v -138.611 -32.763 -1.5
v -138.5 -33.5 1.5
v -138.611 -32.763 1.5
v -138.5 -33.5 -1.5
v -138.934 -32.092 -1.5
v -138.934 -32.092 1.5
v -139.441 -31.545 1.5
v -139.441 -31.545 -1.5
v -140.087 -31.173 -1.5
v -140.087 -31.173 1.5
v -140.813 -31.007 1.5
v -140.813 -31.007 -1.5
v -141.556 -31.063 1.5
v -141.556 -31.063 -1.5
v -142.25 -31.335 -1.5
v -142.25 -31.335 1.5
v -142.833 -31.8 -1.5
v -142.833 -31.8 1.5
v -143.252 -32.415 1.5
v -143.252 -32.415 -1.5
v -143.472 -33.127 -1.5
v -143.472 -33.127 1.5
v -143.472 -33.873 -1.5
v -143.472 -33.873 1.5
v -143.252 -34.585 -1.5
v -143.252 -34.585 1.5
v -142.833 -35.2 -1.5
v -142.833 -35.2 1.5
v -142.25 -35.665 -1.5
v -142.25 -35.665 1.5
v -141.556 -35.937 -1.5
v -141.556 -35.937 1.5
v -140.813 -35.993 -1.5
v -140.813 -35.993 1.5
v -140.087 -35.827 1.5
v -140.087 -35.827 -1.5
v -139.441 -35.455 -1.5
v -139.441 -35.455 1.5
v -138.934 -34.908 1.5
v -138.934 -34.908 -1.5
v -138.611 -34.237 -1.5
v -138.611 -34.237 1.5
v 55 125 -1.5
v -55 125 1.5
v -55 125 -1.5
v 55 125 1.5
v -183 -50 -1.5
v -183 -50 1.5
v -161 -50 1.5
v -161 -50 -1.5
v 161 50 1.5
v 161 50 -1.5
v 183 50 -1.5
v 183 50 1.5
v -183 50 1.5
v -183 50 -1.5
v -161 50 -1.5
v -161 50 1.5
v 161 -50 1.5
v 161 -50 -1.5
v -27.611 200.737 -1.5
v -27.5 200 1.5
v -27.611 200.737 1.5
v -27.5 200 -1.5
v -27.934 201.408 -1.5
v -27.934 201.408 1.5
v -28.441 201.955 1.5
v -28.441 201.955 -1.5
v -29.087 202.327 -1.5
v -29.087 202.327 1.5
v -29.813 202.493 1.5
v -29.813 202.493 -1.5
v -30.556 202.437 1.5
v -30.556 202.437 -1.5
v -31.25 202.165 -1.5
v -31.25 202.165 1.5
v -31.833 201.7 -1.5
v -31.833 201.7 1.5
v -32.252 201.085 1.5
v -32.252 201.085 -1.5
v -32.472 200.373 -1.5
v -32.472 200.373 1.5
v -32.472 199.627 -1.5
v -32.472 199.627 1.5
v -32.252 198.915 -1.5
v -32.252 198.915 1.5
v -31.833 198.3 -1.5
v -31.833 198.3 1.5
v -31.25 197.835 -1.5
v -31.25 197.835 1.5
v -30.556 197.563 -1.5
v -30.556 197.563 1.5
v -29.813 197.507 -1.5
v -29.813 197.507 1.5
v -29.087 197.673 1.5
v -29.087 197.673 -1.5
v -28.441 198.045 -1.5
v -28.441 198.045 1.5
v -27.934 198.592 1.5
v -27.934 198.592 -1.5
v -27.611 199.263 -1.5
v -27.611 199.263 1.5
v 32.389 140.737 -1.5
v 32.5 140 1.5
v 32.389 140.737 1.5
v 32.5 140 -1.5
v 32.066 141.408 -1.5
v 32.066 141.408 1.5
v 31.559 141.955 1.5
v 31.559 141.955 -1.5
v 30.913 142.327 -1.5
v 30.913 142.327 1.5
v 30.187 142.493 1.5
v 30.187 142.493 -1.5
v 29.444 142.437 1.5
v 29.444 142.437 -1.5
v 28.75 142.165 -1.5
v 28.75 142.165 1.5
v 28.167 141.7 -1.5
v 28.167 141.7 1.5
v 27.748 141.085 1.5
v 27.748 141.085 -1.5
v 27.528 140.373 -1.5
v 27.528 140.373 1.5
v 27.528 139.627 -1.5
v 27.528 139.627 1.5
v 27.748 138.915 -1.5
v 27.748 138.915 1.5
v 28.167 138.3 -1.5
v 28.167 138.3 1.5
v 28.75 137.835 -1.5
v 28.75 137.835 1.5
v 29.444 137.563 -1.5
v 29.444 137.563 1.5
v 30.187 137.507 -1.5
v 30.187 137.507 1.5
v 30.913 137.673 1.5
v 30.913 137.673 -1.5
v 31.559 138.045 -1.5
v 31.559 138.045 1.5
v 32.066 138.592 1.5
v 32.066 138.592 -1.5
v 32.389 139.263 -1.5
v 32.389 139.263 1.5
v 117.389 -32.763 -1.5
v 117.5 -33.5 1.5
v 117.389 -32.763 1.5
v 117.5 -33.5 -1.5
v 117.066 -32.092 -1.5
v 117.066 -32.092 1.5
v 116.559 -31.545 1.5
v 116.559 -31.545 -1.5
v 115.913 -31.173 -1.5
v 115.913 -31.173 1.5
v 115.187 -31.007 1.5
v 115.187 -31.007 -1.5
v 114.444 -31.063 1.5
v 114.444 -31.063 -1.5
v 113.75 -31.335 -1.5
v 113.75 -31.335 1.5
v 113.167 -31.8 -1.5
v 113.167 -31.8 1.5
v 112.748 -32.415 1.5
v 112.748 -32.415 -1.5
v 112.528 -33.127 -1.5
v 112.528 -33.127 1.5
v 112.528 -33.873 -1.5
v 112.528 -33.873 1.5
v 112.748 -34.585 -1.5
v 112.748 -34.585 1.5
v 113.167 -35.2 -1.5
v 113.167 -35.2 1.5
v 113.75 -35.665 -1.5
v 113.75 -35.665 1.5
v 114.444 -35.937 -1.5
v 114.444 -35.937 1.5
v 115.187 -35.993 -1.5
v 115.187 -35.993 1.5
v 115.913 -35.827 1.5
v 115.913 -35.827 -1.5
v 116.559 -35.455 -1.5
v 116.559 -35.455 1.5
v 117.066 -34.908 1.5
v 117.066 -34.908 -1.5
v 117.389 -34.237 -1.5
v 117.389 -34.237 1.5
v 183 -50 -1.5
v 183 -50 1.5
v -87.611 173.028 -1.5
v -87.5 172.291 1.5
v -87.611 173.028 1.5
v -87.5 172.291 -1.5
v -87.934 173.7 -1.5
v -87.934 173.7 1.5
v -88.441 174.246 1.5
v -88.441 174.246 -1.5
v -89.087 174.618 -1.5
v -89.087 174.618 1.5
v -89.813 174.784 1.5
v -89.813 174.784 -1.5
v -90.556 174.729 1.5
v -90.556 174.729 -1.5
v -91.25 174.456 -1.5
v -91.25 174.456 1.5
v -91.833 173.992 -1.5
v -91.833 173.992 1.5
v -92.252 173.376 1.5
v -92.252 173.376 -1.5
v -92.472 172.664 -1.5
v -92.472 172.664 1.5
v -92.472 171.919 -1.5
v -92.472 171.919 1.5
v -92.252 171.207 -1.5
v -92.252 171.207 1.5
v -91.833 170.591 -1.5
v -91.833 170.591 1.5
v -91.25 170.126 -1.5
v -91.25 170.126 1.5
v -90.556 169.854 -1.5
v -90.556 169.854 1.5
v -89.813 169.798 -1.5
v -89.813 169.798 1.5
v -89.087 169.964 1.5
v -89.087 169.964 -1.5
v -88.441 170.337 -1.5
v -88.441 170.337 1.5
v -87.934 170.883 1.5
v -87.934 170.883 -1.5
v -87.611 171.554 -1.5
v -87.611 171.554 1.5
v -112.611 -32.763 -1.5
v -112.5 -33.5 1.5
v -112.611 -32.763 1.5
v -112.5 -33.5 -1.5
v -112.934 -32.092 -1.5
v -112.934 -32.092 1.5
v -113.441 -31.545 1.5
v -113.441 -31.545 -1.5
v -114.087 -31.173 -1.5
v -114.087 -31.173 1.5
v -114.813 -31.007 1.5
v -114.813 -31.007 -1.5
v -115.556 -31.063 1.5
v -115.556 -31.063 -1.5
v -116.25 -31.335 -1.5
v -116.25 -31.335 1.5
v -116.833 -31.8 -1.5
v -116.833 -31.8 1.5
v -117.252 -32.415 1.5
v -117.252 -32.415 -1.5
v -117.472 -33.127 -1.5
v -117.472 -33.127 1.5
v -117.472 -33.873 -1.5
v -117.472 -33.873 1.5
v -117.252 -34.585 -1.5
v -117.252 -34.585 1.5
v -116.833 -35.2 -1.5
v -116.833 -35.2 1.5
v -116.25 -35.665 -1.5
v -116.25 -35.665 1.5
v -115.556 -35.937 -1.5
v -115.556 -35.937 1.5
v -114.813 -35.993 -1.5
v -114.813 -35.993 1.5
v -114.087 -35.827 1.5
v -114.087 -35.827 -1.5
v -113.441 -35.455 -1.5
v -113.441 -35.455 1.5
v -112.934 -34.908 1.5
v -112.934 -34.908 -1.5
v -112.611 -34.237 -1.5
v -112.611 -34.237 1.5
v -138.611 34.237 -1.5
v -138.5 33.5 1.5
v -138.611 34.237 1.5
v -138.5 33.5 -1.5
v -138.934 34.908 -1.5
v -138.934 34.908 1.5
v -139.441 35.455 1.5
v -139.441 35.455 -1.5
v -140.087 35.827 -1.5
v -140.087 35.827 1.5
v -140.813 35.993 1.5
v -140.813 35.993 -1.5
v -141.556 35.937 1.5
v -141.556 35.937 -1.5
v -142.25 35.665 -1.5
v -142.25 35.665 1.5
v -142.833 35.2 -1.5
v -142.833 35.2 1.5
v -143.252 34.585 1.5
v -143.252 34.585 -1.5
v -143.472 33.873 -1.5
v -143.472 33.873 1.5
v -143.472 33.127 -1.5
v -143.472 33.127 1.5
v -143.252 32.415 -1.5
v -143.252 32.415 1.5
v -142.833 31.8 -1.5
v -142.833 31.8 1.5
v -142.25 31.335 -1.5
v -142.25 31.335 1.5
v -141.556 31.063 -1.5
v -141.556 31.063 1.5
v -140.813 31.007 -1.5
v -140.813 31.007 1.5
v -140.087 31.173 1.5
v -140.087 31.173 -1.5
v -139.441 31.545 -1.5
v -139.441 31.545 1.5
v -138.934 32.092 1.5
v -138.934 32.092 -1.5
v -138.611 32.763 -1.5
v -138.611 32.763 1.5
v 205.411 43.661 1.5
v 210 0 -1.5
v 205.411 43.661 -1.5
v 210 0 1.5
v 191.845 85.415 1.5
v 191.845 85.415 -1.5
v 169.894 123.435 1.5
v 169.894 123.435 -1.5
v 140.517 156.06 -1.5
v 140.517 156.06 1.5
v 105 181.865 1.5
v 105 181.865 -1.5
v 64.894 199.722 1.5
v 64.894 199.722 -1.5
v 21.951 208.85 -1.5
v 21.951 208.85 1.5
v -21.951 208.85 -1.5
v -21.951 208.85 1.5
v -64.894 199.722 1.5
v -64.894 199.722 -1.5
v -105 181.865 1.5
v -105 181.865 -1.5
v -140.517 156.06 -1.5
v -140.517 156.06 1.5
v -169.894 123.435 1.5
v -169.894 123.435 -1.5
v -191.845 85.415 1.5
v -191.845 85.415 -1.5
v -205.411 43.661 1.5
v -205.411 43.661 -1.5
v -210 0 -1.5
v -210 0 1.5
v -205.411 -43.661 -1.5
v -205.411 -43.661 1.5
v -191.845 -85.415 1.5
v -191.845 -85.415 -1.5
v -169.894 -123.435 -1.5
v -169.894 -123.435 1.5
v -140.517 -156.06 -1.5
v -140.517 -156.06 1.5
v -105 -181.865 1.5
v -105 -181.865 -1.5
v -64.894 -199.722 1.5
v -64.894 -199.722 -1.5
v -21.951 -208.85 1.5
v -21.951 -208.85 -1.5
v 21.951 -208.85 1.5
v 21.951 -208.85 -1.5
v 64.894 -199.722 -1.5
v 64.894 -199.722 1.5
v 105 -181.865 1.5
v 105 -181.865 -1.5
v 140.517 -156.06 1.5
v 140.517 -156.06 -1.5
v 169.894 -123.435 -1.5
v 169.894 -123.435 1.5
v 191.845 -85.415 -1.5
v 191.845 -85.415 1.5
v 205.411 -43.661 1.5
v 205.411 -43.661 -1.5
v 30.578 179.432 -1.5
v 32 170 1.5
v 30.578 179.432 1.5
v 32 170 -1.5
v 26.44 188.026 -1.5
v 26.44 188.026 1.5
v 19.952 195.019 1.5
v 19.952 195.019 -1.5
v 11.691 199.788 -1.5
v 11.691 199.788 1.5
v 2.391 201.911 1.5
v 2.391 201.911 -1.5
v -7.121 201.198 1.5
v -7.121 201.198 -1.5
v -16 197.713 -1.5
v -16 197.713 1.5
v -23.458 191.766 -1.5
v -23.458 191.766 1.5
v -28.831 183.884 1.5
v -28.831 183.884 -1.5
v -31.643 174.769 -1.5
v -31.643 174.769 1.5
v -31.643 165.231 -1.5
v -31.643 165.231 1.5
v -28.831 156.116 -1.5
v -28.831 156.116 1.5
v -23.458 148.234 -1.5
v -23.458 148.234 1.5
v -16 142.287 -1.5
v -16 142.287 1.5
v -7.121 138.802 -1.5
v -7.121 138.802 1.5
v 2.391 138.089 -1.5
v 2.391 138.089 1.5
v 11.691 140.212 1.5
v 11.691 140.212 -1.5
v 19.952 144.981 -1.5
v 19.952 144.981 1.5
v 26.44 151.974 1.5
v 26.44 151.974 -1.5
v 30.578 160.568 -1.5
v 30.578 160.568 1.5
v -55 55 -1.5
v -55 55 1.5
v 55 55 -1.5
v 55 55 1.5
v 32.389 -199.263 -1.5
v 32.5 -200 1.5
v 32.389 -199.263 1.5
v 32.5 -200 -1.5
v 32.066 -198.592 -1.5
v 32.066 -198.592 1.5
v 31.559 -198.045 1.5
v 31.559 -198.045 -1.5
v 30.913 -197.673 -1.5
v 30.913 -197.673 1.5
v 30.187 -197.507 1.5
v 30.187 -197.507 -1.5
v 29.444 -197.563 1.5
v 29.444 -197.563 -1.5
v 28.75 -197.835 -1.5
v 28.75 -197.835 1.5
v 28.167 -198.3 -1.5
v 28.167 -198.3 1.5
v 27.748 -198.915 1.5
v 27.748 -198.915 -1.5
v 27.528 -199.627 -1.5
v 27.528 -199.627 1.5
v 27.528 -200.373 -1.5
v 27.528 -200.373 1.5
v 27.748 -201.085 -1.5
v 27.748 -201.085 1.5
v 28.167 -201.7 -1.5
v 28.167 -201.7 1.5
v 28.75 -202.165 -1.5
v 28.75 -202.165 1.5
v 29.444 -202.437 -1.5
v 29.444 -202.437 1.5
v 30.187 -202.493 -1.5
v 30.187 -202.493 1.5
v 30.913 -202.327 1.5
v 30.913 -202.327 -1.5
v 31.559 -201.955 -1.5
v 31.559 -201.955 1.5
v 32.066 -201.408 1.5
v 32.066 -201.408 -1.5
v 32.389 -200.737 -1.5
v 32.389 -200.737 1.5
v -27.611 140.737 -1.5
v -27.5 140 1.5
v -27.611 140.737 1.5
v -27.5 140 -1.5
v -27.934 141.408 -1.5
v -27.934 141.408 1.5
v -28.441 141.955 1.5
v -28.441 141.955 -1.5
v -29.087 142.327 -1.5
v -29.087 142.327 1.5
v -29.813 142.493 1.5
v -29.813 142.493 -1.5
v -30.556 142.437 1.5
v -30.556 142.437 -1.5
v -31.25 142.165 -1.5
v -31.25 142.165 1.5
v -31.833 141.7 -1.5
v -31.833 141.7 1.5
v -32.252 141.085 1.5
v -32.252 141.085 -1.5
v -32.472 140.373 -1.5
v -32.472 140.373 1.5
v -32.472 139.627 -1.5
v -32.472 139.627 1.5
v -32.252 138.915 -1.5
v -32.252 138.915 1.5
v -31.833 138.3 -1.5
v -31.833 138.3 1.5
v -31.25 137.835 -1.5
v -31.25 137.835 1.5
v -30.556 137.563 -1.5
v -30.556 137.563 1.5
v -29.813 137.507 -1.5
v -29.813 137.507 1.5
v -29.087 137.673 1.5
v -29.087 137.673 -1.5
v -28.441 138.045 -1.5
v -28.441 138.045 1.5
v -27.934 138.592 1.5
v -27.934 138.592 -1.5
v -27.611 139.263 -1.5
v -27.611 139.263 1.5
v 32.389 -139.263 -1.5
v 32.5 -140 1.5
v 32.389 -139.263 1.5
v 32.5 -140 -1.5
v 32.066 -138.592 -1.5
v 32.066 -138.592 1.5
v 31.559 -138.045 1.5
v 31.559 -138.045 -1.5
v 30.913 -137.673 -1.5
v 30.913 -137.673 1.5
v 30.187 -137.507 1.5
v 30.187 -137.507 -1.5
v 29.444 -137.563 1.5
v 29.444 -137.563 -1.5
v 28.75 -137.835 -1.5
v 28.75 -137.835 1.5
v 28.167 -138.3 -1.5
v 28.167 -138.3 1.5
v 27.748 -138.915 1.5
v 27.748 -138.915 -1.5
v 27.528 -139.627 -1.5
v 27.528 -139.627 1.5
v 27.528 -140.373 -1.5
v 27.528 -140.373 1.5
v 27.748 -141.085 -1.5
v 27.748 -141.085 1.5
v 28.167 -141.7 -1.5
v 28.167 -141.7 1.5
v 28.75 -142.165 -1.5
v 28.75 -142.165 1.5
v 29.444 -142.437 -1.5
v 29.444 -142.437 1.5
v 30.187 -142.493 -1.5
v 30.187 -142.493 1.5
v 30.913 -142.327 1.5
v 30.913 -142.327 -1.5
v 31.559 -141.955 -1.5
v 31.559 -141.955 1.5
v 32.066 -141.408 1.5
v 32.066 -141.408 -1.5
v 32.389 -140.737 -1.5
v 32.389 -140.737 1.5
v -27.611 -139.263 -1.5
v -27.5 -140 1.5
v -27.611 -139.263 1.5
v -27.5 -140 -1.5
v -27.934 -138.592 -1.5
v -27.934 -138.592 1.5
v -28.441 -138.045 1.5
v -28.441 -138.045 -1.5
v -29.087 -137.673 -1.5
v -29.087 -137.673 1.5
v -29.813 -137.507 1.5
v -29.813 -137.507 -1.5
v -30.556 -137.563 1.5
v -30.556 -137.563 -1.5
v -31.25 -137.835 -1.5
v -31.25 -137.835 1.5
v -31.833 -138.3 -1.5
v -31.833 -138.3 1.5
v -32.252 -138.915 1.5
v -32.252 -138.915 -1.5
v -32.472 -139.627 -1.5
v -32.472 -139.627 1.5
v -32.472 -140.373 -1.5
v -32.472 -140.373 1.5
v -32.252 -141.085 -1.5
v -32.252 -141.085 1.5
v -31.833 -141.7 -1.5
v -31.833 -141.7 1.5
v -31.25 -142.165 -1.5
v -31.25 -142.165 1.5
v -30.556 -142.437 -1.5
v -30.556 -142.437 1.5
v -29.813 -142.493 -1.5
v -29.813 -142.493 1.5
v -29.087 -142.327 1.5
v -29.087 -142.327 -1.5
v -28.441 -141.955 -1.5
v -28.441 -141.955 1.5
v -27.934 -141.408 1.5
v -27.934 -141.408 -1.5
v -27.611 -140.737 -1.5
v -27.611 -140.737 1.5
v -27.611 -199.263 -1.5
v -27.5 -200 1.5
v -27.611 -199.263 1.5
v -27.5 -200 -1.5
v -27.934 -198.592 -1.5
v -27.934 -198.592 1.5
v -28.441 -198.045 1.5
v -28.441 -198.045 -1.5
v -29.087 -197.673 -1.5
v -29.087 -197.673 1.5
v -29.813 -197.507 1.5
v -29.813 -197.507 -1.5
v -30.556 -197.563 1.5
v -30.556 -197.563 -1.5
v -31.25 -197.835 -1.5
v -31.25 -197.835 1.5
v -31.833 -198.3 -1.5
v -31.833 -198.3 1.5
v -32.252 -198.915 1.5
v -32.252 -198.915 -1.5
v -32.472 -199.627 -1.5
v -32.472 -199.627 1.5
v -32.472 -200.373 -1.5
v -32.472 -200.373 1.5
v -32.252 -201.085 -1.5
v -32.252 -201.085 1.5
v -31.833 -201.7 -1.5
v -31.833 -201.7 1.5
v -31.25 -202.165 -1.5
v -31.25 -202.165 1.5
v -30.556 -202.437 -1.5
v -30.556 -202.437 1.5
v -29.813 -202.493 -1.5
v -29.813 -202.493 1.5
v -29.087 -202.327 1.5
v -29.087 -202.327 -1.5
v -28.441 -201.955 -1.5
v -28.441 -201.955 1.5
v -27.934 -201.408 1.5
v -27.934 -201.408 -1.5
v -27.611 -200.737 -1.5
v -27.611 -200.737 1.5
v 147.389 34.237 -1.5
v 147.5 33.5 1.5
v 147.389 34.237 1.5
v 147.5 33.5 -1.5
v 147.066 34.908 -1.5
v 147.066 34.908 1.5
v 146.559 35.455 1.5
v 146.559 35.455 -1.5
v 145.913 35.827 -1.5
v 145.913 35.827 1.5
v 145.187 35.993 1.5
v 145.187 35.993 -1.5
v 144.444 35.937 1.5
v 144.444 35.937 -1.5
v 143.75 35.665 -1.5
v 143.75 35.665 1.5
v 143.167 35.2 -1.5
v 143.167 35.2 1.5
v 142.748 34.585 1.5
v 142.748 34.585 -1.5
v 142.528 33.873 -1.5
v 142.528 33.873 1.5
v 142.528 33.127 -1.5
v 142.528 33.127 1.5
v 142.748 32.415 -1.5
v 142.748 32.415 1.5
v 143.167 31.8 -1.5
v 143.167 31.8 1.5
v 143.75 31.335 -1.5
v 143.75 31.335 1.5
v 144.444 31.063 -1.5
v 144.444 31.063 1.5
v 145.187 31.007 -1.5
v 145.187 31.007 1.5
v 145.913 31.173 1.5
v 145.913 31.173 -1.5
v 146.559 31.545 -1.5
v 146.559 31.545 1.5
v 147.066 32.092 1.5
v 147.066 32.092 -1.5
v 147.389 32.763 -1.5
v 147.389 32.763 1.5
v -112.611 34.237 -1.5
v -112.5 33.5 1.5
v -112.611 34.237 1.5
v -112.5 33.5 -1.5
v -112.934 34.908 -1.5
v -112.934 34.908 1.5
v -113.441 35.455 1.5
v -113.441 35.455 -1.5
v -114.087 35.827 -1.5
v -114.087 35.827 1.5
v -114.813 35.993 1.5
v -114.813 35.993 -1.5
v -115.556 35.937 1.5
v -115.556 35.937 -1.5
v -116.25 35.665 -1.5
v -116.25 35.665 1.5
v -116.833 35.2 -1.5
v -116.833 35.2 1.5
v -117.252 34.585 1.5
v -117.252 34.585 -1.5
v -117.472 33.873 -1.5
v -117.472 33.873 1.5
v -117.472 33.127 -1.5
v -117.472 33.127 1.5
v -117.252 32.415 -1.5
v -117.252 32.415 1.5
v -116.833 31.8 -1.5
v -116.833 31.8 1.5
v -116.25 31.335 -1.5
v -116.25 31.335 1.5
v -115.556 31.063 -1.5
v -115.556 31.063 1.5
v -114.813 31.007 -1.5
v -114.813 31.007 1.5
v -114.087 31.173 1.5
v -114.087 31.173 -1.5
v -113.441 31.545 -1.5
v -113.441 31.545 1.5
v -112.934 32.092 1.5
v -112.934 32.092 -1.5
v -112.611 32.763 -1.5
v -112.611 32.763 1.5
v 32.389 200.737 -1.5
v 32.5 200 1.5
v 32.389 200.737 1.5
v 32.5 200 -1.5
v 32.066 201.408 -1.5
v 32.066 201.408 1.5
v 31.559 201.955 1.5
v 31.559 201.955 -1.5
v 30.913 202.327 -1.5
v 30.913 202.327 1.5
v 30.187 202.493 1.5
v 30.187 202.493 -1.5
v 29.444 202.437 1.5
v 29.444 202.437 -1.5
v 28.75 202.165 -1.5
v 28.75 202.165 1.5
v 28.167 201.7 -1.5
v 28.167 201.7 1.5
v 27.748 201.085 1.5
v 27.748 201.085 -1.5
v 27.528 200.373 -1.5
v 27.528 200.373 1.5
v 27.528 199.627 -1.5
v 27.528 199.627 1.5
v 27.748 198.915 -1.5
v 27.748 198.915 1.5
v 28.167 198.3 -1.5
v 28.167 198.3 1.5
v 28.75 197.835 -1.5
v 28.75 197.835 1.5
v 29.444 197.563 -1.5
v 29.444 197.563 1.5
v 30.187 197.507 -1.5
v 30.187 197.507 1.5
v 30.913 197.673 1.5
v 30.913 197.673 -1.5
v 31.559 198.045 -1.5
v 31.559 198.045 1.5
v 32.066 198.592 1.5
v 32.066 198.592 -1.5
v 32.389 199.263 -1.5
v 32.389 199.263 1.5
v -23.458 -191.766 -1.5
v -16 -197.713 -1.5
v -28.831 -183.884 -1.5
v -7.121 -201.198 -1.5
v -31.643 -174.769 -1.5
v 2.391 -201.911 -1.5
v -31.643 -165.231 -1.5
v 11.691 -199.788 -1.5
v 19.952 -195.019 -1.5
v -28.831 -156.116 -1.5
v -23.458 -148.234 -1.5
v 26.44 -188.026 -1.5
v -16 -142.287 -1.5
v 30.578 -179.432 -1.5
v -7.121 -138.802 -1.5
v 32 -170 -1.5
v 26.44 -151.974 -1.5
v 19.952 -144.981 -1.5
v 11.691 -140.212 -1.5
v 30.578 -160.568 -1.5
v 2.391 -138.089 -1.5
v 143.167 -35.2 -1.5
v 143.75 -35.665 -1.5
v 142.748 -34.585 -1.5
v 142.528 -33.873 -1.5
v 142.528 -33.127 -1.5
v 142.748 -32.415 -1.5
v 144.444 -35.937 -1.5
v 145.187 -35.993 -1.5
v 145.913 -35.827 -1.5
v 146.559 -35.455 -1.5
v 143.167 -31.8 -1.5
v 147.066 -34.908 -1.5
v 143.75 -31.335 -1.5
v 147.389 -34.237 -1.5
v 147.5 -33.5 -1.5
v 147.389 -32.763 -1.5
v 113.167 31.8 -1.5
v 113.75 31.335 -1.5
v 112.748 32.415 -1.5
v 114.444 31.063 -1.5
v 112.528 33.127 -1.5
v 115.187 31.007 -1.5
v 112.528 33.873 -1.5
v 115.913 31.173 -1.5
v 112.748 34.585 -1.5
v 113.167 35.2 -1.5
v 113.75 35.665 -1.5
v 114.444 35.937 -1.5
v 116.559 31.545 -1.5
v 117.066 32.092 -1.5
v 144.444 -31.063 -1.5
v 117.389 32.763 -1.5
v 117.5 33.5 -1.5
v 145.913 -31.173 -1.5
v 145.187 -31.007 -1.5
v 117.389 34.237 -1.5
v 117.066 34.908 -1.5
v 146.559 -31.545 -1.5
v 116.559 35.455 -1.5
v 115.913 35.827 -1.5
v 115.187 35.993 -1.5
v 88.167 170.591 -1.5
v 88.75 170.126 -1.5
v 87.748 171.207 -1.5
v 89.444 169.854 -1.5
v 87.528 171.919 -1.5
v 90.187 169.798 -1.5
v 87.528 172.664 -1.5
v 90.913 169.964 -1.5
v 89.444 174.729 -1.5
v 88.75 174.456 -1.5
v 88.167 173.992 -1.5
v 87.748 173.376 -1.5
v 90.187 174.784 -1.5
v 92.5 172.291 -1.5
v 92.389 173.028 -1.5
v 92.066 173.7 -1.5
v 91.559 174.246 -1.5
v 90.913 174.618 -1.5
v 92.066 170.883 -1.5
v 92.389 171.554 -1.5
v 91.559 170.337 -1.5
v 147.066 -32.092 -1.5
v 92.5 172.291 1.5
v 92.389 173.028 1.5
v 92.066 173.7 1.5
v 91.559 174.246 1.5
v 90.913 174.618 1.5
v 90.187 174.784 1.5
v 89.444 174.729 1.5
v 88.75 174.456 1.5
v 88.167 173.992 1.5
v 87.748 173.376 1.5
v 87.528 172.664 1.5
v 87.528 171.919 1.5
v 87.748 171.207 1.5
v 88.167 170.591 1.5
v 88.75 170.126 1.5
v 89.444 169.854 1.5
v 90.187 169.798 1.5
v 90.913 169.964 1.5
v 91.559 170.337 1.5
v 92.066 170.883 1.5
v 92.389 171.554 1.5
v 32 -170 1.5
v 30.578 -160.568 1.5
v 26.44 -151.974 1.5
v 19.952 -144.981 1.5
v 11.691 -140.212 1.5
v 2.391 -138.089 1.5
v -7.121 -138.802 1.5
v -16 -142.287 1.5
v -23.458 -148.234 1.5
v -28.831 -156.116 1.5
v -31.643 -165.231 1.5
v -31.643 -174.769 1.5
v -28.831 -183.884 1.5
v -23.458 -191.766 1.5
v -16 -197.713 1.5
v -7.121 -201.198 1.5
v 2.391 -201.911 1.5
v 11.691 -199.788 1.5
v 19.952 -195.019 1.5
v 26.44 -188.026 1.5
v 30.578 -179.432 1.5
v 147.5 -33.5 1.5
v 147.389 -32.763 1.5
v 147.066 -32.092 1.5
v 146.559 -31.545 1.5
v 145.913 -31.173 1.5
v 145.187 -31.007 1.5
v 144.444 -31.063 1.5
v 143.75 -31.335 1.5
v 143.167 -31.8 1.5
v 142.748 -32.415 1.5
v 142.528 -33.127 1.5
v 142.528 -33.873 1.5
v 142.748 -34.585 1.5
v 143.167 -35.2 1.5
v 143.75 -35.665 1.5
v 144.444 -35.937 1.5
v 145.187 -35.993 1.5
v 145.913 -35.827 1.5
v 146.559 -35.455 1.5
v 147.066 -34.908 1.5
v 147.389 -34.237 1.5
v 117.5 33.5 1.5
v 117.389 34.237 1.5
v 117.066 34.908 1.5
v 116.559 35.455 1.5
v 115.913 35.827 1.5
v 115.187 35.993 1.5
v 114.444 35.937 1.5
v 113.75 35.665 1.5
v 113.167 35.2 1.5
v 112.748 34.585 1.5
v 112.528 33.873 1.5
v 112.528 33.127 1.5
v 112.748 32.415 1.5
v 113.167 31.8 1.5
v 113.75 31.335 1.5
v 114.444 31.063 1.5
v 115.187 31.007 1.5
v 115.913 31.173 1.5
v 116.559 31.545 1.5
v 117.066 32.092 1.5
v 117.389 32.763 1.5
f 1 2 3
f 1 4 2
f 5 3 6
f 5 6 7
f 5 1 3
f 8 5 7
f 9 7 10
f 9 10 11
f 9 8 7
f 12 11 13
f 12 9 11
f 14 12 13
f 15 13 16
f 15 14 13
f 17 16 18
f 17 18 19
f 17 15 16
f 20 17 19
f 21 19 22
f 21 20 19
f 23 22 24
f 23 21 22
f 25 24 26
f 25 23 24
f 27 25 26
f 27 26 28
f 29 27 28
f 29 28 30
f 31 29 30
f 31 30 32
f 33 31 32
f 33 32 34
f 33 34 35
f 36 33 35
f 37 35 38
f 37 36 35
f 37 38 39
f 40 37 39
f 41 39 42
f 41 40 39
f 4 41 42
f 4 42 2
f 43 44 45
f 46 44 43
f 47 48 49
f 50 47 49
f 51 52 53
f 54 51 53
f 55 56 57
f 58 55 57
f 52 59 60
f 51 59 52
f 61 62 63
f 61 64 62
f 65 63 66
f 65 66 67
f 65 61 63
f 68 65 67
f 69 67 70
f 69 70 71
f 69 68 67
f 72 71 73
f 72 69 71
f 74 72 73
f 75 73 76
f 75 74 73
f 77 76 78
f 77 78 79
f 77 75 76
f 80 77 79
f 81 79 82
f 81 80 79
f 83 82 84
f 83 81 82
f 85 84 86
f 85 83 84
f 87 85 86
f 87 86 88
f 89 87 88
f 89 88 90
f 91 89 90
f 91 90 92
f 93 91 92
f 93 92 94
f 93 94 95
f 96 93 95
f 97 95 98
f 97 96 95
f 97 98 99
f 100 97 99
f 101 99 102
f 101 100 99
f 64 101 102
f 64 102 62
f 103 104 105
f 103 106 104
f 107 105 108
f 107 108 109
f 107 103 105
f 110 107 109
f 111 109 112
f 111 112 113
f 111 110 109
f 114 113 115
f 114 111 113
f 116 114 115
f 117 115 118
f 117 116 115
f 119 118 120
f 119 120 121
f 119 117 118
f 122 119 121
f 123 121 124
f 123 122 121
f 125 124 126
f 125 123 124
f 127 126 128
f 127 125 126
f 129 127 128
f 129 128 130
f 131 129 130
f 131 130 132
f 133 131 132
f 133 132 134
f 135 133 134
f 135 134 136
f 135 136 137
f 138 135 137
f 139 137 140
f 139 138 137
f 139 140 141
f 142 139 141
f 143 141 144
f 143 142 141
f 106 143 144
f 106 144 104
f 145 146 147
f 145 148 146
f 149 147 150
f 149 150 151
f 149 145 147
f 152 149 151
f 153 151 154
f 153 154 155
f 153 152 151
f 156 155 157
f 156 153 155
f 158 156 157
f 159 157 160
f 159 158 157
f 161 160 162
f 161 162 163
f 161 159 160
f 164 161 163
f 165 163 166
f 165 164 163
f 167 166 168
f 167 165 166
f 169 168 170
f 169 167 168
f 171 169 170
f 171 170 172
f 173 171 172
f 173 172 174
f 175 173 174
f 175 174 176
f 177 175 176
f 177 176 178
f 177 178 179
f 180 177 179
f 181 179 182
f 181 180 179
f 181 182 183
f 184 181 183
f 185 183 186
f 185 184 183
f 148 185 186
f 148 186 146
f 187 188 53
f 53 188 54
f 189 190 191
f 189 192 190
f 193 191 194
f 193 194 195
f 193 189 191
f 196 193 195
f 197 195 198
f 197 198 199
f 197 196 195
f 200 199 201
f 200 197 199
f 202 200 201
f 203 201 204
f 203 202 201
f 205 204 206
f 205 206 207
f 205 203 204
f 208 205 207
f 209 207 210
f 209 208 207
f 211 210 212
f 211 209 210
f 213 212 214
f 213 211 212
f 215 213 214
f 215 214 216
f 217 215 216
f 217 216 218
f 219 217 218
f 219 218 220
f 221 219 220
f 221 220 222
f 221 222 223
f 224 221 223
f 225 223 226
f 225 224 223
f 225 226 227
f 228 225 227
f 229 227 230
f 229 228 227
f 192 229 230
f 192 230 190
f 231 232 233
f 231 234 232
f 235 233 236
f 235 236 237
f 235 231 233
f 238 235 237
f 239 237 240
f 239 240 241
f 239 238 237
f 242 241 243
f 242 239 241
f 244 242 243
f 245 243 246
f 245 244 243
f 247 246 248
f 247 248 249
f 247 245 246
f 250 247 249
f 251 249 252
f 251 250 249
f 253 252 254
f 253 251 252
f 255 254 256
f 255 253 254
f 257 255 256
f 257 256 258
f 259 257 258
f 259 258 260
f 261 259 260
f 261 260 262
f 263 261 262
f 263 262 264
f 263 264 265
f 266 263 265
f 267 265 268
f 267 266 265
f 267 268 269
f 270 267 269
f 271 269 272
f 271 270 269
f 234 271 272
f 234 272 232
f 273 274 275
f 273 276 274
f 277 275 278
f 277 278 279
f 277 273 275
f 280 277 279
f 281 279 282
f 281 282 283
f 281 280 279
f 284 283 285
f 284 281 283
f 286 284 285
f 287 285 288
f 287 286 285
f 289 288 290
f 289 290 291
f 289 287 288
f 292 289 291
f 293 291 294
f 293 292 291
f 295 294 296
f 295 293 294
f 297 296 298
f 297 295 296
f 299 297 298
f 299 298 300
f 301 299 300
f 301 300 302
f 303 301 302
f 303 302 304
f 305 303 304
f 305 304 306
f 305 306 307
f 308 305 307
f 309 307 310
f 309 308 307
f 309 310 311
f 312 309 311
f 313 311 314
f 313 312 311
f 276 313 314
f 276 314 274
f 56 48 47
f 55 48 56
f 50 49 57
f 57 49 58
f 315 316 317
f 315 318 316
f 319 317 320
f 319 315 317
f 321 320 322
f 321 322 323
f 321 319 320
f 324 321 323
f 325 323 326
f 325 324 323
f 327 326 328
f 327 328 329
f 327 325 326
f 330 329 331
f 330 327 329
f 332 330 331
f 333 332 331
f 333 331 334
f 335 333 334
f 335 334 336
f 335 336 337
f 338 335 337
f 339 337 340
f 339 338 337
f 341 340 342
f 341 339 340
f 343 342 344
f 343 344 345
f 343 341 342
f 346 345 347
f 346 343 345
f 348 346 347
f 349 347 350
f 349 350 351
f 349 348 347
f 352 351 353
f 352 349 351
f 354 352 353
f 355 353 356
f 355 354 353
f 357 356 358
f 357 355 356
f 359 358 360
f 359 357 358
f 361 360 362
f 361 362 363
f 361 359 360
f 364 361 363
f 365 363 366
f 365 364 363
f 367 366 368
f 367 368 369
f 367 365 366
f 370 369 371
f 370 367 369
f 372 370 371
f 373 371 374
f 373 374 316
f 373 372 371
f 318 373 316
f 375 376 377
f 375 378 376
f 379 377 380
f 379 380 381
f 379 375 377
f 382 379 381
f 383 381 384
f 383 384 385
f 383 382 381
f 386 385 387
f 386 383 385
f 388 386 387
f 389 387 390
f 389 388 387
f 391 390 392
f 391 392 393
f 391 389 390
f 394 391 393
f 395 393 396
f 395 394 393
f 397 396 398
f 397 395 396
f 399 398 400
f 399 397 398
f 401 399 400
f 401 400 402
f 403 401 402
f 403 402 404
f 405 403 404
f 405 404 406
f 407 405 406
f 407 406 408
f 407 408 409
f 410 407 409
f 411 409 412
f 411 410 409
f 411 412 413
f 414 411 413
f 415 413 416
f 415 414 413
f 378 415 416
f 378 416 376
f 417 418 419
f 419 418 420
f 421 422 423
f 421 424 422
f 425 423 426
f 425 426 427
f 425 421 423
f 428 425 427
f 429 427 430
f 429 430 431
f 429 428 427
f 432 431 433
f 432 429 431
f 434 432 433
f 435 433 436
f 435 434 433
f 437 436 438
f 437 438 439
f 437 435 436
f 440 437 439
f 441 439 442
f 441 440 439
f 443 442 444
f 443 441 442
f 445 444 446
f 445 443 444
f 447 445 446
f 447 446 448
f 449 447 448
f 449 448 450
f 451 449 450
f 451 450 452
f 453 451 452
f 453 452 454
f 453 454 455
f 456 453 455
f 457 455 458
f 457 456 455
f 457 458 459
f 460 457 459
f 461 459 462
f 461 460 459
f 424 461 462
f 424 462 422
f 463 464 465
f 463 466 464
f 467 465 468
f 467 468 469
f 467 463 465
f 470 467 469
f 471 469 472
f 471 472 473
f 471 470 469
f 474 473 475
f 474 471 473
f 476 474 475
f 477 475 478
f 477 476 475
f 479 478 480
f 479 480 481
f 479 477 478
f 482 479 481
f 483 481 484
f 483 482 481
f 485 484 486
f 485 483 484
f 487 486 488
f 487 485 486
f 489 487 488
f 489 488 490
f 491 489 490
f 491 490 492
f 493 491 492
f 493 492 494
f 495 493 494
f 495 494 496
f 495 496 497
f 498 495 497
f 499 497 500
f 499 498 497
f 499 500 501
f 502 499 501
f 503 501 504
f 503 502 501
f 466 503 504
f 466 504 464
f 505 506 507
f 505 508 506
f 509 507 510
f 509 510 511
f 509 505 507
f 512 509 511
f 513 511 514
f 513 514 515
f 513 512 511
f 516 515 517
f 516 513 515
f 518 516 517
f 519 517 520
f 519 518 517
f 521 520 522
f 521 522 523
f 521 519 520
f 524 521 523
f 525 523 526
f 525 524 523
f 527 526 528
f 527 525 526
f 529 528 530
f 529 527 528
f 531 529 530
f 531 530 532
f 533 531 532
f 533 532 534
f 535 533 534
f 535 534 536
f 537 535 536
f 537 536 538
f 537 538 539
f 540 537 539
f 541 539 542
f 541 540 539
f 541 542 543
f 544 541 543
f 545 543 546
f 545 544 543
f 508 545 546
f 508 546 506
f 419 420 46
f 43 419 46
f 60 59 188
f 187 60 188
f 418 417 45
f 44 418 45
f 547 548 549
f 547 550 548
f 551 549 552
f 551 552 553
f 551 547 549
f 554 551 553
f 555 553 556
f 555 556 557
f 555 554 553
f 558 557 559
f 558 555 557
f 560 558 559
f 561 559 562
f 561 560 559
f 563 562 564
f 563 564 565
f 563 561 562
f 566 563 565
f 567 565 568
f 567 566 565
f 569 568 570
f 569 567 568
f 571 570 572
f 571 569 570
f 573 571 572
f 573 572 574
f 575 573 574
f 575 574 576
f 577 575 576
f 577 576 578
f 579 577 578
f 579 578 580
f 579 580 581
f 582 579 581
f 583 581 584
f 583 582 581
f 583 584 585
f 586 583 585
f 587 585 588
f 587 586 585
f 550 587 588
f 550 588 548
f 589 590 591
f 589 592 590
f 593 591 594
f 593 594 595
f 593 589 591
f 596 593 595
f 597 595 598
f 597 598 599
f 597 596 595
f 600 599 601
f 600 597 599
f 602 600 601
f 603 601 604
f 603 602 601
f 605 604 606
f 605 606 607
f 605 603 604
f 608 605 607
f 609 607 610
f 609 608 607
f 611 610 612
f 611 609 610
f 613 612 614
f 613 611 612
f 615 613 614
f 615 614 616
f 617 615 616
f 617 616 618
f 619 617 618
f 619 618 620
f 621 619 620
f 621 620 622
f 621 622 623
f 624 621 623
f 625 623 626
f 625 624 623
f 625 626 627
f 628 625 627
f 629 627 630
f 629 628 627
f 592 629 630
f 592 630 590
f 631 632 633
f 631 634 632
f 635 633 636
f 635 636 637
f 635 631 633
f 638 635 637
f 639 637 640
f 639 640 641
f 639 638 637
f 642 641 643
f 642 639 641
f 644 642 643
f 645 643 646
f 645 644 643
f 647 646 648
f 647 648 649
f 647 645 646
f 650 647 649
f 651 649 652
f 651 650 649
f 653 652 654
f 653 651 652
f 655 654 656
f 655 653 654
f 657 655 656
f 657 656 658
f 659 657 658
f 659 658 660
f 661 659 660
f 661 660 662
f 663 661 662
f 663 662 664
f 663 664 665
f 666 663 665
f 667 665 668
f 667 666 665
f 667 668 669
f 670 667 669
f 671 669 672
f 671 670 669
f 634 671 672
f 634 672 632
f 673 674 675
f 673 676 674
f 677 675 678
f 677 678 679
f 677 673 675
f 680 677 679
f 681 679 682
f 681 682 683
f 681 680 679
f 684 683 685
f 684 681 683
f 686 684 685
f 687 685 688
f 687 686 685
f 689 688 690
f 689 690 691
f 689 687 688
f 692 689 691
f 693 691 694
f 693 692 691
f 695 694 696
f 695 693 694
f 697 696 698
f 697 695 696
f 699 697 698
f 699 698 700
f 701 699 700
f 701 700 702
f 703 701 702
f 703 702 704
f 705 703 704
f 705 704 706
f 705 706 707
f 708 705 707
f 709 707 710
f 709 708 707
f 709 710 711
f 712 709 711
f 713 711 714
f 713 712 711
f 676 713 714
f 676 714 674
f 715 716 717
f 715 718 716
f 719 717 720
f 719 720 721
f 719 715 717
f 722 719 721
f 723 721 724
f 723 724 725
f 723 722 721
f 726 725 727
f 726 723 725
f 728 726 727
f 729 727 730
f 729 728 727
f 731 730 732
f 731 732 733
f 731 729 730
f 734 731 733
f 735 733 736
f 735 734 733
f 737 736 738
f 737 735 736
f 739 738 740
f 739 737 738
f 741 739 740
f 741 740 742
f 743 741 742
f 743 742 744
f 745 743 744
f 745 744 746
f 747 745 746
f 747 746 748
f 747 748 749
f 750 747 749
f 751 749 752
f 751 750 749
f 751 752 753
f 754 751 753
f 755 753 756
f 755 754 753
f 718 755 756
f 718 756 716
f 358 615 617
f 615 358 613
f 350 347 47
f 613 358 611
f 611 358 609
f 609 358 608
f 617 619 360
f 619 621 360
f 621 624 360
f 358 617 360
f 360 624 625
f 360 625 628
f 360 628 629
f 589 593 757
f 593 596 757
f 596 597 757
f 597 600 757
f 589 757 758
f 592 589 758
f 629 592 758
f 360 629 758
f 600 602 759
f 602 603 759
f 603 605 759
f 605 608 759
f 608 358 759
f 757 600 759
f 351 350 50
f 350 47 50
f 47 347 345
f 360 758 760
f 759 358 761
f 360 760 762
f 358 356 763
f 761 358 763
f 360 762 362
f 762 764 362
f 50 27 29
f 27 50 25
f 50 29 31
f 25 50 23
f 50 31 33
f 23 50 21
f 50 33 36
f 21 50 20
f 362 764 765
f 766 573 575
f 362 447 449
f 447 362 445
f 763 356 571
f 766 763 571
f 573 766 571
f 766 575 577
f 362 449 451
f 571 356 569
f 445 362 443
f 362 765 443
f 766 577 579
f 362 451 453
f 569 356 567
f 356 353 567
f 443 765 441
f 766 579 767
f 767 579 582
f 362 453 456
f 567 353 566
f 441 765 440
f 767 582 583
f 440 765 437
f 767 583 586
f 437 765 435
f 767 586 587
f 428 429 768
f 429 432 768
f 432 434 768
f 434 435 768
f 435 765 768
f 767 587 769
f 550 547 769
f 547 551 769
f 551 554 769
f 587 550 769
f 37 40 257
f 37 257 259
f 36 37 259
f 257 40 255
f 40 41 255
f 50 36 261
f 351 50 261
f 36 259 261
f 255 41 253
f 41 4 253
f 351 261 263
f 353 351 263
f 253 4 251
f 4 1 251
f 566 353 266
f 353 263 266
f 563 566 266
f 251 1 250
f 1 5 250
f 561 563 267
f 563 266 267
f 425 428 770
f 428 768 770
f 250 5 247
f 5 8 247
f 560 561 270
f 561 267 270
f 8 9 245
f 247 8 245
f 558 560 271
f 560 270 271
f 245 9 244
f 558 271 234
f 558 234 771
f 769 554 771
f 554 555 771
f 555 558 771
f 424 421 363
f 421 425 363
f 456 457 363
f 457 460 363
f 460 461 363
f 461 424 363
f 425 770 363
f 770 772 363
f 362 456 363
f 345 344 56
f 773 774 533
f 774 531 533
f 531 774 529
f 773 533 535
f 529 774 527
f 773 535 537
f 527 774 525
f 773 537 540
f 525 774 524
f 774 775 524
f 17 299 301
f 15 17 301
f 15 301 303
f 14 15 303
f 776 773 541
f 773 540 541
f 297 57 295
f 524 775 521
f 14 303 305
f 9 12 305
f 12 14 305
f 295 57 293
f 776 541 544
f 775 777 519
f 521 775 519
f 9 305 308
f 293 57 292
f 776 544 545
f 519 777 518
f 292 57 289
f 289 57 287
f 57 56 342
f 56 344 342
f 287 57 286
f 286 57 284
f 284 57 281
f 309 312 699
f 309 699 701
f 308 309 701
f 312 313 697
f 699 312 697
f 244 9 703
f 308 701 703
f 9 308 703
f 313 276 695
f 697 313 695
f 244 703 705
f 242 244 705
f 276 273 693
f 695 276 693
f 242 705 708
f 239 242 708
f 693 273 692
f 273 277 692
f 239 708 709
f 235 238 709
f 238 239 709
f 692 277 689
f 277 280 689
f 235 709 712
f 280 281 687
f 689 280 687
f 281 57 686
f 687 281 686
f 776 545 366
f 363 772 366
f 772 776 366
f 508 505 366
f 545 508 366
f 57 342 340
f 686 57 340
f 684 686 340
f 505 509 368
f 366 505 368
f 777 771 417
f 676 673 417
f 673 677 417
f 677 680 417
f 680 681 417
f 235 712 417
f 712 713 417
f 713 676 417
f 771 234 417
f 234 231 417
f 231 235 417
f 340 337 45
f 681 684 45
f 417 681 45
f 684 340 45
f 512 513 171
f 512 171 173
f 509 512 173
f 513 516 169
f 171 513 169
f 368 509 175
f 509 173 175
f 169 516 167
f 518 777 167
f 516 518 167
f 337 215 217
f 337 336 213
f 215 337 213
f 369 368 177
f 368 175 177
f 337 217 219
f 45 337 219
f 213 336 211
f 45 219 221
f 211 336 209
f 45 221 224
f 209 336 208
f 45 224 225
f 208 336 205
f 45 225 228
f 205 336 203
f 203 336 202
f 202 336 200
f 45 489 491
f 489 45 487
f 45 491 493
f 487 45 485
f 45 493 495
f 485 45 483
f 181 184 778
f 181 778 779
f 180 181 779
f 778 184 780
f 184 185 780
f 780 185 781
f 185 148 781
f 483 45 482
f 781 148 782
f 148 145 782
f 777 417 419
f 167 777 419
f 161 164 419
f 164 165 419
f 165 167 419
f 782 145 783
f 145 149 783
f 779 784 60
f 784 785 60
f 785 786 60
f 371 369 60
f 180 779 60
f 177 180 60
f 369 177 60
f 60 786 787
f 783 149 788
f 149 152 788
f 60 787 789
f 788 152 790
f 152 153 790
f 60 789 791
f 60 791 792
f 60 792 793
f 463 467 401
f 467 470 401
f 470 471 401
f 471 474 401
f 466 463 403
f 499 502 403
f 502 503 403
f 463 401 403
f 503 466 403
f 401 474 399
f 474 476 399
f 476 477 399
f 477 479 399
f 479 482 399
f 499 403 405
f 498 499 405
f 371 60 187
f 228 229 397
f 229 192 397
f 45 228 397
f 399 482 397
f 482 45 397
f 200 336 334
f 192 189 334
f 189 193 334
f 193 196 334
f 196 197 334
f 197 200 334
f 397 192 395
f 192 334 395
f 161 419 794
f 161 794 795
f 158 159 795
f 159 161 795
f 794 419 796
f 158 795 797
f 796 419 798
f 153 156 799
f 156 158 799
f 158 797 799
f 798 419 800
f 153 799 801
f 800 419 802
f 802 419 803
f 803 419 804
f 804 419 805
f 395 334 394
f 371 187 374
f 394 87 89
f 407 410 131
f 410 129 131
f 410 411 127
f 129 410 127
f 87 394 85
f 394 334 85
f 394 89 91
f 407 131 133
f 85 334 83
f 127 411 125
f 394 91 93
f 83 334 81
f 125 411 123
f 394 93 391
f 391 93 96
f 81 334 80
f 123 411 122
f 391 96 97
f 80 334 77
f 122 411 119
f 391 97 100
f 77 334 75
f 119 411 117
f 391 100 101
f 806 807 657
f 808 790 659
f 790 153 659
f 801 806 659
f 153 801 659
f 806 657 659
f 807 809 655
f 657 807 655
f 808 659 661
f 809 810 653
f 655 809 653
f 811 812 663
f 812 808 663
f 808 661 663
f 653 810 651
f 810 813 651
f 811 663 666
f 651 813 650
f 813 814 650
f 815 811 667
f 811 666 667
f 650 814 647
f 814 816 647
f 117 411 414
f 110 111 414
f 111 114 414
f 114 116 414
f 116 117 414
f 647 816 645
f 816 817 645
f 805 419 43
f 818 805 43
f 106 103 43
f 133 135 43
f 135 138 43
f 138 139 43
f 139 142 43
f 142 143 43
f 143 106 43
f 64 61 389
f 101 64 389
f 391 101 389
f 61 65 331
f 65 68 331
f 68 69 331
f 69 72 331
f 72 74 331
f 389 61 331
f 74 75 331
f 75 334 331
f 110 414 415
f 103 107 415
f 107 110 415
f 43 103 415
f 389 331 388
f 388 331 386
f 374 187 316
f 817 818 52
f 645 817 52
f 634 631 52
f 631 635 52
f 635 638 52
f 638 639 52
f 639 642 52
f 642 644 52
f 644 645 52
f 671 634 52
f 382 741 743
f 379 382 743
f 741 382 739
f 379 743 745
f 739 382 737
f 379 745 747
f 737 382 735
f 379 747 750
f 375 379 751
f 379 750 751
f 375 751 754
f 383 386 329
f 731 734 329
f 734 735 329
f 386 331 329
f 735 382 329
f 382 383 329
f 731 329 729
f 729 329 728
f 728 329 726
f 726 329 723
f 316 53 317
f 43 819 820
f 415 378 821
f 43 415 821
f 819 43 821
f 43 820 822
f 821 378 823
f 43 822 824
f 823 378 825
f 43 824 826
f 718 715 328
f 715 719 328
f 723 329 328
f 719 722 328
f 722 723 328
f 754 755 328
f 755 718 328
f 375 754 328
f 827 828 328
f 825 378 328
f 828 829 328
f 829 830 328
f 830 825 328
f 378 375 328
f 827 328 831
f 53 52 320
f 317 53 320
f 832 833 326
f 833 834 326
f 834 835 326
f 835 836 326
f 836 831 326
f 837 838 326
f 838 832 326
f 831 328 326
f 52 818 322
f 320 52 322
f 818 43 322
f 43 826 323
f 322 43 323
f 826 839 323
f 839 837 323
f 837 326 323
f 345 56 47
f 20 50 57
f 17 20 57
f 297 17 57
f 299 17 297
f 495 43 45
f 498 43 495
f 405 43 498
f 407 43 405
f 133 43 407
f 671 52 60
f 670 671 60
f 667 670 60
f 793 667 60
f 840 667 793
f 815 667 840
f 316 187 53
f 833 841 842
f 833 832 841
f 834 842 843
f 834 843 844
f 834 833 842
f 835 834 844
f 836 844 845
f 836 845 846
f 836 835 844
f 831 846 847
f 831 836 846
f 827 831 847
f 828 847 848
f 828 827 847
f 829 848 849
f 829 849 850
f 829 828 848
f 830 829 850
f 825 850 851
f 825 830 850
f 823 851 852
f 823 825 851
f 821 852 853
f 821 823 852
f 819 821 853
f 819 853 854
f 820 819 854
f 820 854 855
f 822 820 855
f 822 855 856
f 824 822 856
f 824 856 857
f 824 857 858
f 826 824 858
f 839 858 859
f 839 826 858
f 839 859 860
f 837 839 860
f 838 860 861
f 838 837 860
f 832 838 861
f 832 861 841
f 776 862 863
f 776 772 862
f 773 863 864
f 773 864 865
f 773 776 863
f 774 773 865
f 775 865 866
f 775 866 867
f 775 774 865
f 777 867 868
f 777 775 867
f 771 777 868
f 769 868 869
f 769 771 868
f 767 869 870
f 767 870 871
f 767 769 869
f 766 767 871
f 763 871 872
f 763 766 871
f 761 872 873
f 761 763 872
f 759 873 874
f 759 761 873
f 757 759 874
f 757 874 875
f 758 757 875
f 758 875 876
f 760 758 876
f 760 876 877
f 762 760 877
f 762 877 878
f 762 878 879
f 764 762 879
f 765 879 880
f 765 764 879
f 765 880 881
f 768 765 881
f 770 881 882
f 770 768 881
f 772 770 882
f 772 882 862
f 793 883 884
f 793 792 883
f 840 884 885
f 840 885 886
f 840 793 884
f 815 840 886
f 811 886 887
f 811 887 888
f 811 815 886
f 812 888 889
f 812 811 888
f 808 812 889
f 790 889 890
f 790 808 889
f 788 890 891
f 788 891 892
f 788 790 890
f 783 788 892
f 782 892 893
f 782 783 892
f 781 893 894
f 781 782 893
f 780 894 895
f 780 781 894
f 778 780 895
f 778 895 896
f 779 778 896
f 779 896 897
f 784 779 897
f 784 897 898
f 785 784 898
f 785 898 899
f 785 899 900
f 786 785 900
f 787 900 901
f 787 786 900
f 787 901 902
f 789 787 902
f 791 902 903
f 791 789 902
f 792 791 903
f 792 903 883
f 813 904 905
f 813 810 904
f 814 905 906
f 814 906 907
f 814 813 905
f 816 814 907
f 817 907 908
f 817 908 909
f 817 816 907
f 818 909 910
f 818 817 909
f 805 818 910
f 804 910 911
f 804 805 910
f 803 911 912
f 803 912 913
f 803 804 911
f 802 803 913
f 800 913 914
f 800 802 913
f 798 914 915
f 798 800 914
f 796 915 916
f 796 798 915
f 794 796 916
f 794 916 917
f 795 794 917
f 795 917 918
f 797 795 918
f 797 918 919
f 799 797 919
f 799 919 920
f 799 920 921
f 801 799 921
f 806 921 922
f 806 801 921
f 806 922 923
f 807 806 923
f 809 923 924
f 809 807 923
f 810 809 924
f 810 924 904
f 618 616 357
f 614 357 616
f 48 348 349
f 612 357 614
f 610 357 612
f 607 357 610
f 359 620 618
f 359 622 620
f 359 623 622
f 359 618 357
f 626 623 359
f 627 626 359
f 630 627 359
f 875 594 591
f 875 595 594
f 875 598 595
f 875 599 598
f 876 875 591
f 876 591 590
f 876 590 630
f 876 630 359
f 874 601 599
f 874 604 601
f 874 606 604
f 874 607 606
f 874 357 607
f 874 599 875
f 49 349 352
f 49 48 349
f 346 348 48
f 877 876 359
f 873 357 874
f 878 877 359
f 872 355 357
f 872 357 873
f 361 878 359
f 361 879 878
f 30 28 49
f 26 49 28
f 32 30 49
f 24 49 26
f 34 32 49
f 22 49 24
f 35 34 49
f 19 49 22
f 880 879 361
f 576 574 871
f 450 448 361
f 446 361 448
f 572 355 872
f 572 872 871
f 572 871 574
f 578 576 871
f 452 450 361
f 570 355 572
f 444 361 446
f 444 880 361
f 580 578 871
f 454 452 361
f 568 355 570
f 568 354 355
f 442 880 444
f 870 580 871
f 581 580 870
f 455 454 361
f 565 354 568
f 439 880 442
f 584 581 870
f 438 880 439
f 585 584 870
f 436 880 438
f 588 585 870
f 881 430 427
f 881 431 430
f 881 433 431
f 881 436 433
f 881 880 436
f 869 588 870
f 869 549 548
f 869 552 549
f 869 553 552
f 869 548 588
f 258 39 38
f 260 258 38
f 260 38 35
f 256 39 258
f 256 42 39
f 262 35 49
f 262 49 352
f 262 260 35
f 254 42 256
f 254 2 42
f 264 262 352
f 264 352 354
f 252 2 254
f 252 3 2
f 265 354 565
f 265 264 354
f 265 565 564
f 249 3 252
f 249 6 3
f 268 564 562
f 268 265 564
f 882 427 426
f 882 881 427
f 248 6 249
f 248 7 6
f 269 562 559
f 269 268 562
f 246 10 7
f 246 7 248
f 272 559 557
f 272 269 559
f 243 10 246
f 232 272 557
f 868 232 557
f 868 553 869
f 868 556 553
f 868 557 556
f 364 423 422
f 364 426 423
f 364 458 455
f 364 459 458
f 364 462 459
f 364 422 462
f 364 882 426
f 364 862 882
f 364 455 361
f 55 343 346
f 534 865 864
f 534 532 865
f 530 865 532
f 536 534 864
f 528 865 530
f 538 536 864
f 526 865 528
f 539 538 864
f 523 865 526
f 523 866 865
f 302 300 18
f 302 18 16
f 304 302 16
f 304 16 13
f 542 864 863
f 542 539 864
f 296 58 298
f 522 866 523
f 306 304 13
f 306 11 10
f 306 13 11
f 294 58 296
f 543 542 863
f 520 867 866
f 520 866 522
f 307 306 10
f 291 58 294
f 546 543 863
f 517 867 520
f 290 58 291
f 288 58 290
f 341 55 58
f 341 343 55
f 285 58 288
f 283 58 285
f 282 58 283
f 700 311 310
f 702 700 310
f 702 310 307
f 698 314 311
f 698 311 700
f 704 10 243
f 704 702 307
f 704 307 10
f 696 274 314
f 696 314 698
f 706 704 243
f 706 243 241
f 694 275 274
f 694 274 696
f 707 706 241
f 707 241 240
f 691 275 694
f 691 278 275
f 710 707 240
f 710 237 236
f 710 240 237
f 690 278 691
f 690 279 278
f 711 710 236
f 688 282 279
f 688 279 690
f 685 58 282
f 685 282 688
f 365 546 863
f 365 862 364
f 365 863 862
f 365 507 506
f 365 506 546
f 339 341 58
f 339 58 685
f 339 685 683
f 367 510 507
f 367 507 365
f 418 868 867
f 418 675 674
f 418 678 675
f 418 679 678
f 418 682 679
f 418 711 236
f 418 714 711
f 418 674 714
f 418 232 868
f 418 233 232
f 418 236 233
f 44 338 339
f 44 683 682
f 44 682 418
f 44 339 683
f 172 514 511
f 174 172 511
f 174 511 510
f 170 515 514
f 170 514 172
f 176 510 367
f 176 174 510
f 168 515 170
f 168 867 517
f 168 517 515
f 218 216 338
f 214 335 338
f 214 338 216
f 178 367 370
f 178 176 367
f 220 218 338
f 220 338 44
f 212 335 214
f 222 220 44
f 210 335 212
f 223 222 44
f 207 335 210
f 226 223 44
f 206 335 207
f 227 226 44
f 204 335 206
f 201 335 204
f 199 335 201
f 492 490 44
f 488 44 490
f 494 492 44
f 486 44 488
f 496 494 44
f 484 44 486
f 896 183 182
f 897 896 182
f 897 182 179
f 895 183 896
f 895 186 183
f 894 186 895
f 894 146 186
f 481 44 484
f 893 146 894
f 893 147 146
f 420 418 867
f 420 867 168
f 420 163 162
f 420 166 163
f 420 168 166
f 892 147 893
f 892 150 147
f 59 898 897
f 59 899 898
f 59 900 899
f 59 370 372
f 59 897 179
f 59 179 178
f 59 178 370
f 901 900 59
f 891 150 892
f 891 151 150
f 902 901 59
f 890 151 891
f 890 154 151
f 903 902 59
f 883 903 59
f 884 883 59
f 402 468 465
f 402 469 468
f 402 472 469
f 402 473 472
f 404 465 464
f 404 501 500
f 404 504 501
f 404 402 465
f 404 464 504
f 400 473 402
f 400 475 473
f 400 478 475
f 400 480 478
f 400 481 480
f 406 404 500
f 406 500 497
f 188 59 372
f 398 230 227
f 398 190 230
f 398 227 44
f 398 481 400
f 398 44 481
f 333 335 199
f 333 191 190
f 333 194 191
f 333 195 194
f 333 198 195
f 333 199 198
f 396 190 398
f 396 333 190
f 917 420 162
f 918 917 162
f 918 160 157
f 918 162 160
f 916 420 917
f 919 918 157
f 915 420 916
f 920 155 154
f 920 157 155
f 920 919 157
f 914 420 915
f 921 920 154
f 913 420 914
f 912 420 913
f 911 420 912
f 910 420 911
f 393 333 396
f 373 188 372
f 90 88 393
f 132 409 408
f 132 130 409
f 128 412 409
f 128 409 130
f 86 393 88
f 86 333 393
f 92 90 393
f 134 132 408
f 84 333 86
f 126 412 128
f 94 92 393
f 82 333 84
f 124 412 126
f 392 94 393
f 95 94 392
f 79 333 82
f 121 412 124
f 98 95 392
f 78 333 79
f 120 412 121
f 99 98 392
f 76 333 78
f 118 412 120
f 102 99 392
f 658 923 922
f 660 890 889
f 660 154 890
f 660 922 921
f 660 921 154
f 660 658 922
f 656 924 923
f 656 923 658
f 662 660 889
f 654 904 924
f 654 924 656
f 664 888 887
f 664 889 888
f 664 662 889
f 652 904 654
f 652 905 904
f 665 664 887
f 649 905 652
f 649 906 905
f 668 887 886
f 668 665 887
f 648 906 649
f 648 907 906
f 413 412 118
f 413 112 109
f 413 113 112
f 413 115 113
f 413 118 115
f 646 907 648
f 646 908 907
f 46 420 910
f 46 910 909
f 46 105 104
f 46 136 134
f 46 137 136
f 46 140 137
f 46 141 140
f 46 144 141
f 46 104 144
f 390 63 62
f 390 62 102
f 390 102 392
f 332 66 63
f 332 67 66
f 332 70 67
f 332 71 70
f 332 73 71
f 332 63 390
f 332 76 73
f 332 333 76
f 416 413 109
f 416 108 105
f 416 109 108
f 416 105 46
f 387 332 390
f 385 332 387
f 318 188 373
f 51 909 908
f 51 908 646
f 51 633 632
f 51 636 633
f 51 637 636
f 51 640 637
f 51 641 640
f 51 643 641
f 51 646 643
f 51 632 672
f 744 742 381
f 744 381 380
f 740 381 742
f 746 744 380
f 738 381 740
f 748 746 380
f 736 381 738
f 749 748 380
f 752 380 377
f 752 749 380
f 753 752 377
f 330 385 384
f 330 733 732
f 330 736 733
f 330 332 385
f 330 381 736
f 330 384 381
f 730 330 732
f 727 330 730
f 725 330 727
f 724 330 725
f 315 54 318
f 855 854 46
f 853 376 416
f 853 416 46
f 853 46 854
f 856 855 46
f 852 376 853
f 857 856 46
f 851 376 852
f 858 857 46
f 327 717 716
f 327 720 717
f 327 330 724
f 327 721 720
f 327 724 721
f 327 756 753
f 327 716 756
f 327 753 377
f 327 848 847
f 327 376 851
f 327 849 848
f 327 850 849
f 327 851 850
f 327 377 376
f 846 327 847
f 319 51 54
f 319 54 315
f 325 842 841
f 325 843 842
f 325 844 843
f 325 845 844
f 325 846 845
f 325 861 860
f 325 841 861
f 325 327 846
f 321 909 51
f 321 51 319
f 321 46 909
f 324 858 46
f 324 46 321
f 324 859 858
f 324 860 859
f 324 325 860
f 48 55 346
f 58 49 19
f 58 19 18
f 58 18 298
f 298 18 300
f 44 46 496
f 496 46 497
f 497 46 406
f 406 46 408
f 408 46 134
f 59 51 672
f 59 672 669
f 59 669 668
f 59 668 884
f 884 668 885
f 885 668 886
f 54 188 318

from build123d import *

# Parameters (mm, degrees)
SKETCH_R   = 210
SKETCH_R_2 = 32
SKETCH_R_3 = 2.5
SKETCH_W   = 22
SKETCH_H   = 100
SKETCH_W_2 = 110
SKETCH_H_2 = 70
PAD_DEPTH  = 1.5


with BuildPart() as part:
    # Sketch → Pad (new body, symmetric)
    with BuildSketch(Plane.XY):
        Circle(SKETCH_R)
        with Locations((0, 170)):
            Circle(SKETCH_R_2, mode=Mode.SUBTRACT)
        with Locations((0, -170)):
            Circle(SKETCH_R_2, mode=Mode.SUBTRACT)
        with Locations((-141, 33.5)):
            Circle(SKETCH_R_3, mode=Mode.SUBTRACT)
        with Locations((-141, -33.5)):
            Circle(SKETCH_R_3, mode=Mode.SUBTRACT)
        with Locations((-115, 33.5)):
            Circle(SKETCH_R_3, mode=Mode.SUBTRACT)
        with Locations((-115, -33.5)):
            Circle(SKETCH_R_3, mode=Mode.SUBTRACT)
        with Locations((115, 33.5)):
            Circle(SKETCH_R_3, mode=Mode.SUBTRACT)
        with Locations((115, -33.5)):
            Circle(SKETCH_R_3, mode=Mode.SUBTRACT)
        with Locations((145, 33.5)):
            Circle(SKETCH_R_3, mode=Mode.SUBTRACT)
        with Locations((145, -33.5)):
            Circle(SKETCH_R_3, mode=Mode.SUBTRACT)
        with Locations((-90, 172.29129)):
            Circle(SKETCH_R_3, mode=Mode.SUBTRACT)
        with Locations((90, 172.29129)):
            Circle(SKETCH_R_3, mode=Mode.SUBTRACT)
        with Locations((-30, 200)):
            Circle(SKETCH_R_3, mode=Mode.SUBTRACT)
        with Locations((30, 200)):
            Circle(SKETCH_R_3, mode=Mode.SUBTRACT)
        with Locations((-30, 140)):
            Circle(SKETCH_R_3, mode=Mode.SUBTRACT)
        with Locations((30, 140)):
            Circle(SKETCH_R_3, mode=Mode.SUBTRACT)
        with Locations((-30, -140)):
            Circle(SKETCH_R_3, mode=Mode.SUBTRACT)
        with Locations((30, -140)):
            Circle(SKETCH_R_3, mode=Mode.SUBTRACT)
        with Locations((-30, -200)):
            Circle(SKETCH_R_3, mode=Mode.SUBTRACT)
        with Locations((30, -200)):
            Circle(SKETCH_R_3, mode=Mode.SUBTRACT)
        with Locations((-172, 0)):
            Rectangle(SKETCH_W, SKETCH_H, mode=Mode.SUBTRACT)
        with Locations((172, 0)):
            Rectangle(SKETCH_W, SKETCH_H, mode=Mode.SUBTRACT)
        with Locations((0, 90)):
            Rectangle(SKETCH_W_2, SKETCH_H_2, mode=Mode.SUBTRACT)
    extrude(amount=PAD_DEPTH, both=True)


solid = part.part
